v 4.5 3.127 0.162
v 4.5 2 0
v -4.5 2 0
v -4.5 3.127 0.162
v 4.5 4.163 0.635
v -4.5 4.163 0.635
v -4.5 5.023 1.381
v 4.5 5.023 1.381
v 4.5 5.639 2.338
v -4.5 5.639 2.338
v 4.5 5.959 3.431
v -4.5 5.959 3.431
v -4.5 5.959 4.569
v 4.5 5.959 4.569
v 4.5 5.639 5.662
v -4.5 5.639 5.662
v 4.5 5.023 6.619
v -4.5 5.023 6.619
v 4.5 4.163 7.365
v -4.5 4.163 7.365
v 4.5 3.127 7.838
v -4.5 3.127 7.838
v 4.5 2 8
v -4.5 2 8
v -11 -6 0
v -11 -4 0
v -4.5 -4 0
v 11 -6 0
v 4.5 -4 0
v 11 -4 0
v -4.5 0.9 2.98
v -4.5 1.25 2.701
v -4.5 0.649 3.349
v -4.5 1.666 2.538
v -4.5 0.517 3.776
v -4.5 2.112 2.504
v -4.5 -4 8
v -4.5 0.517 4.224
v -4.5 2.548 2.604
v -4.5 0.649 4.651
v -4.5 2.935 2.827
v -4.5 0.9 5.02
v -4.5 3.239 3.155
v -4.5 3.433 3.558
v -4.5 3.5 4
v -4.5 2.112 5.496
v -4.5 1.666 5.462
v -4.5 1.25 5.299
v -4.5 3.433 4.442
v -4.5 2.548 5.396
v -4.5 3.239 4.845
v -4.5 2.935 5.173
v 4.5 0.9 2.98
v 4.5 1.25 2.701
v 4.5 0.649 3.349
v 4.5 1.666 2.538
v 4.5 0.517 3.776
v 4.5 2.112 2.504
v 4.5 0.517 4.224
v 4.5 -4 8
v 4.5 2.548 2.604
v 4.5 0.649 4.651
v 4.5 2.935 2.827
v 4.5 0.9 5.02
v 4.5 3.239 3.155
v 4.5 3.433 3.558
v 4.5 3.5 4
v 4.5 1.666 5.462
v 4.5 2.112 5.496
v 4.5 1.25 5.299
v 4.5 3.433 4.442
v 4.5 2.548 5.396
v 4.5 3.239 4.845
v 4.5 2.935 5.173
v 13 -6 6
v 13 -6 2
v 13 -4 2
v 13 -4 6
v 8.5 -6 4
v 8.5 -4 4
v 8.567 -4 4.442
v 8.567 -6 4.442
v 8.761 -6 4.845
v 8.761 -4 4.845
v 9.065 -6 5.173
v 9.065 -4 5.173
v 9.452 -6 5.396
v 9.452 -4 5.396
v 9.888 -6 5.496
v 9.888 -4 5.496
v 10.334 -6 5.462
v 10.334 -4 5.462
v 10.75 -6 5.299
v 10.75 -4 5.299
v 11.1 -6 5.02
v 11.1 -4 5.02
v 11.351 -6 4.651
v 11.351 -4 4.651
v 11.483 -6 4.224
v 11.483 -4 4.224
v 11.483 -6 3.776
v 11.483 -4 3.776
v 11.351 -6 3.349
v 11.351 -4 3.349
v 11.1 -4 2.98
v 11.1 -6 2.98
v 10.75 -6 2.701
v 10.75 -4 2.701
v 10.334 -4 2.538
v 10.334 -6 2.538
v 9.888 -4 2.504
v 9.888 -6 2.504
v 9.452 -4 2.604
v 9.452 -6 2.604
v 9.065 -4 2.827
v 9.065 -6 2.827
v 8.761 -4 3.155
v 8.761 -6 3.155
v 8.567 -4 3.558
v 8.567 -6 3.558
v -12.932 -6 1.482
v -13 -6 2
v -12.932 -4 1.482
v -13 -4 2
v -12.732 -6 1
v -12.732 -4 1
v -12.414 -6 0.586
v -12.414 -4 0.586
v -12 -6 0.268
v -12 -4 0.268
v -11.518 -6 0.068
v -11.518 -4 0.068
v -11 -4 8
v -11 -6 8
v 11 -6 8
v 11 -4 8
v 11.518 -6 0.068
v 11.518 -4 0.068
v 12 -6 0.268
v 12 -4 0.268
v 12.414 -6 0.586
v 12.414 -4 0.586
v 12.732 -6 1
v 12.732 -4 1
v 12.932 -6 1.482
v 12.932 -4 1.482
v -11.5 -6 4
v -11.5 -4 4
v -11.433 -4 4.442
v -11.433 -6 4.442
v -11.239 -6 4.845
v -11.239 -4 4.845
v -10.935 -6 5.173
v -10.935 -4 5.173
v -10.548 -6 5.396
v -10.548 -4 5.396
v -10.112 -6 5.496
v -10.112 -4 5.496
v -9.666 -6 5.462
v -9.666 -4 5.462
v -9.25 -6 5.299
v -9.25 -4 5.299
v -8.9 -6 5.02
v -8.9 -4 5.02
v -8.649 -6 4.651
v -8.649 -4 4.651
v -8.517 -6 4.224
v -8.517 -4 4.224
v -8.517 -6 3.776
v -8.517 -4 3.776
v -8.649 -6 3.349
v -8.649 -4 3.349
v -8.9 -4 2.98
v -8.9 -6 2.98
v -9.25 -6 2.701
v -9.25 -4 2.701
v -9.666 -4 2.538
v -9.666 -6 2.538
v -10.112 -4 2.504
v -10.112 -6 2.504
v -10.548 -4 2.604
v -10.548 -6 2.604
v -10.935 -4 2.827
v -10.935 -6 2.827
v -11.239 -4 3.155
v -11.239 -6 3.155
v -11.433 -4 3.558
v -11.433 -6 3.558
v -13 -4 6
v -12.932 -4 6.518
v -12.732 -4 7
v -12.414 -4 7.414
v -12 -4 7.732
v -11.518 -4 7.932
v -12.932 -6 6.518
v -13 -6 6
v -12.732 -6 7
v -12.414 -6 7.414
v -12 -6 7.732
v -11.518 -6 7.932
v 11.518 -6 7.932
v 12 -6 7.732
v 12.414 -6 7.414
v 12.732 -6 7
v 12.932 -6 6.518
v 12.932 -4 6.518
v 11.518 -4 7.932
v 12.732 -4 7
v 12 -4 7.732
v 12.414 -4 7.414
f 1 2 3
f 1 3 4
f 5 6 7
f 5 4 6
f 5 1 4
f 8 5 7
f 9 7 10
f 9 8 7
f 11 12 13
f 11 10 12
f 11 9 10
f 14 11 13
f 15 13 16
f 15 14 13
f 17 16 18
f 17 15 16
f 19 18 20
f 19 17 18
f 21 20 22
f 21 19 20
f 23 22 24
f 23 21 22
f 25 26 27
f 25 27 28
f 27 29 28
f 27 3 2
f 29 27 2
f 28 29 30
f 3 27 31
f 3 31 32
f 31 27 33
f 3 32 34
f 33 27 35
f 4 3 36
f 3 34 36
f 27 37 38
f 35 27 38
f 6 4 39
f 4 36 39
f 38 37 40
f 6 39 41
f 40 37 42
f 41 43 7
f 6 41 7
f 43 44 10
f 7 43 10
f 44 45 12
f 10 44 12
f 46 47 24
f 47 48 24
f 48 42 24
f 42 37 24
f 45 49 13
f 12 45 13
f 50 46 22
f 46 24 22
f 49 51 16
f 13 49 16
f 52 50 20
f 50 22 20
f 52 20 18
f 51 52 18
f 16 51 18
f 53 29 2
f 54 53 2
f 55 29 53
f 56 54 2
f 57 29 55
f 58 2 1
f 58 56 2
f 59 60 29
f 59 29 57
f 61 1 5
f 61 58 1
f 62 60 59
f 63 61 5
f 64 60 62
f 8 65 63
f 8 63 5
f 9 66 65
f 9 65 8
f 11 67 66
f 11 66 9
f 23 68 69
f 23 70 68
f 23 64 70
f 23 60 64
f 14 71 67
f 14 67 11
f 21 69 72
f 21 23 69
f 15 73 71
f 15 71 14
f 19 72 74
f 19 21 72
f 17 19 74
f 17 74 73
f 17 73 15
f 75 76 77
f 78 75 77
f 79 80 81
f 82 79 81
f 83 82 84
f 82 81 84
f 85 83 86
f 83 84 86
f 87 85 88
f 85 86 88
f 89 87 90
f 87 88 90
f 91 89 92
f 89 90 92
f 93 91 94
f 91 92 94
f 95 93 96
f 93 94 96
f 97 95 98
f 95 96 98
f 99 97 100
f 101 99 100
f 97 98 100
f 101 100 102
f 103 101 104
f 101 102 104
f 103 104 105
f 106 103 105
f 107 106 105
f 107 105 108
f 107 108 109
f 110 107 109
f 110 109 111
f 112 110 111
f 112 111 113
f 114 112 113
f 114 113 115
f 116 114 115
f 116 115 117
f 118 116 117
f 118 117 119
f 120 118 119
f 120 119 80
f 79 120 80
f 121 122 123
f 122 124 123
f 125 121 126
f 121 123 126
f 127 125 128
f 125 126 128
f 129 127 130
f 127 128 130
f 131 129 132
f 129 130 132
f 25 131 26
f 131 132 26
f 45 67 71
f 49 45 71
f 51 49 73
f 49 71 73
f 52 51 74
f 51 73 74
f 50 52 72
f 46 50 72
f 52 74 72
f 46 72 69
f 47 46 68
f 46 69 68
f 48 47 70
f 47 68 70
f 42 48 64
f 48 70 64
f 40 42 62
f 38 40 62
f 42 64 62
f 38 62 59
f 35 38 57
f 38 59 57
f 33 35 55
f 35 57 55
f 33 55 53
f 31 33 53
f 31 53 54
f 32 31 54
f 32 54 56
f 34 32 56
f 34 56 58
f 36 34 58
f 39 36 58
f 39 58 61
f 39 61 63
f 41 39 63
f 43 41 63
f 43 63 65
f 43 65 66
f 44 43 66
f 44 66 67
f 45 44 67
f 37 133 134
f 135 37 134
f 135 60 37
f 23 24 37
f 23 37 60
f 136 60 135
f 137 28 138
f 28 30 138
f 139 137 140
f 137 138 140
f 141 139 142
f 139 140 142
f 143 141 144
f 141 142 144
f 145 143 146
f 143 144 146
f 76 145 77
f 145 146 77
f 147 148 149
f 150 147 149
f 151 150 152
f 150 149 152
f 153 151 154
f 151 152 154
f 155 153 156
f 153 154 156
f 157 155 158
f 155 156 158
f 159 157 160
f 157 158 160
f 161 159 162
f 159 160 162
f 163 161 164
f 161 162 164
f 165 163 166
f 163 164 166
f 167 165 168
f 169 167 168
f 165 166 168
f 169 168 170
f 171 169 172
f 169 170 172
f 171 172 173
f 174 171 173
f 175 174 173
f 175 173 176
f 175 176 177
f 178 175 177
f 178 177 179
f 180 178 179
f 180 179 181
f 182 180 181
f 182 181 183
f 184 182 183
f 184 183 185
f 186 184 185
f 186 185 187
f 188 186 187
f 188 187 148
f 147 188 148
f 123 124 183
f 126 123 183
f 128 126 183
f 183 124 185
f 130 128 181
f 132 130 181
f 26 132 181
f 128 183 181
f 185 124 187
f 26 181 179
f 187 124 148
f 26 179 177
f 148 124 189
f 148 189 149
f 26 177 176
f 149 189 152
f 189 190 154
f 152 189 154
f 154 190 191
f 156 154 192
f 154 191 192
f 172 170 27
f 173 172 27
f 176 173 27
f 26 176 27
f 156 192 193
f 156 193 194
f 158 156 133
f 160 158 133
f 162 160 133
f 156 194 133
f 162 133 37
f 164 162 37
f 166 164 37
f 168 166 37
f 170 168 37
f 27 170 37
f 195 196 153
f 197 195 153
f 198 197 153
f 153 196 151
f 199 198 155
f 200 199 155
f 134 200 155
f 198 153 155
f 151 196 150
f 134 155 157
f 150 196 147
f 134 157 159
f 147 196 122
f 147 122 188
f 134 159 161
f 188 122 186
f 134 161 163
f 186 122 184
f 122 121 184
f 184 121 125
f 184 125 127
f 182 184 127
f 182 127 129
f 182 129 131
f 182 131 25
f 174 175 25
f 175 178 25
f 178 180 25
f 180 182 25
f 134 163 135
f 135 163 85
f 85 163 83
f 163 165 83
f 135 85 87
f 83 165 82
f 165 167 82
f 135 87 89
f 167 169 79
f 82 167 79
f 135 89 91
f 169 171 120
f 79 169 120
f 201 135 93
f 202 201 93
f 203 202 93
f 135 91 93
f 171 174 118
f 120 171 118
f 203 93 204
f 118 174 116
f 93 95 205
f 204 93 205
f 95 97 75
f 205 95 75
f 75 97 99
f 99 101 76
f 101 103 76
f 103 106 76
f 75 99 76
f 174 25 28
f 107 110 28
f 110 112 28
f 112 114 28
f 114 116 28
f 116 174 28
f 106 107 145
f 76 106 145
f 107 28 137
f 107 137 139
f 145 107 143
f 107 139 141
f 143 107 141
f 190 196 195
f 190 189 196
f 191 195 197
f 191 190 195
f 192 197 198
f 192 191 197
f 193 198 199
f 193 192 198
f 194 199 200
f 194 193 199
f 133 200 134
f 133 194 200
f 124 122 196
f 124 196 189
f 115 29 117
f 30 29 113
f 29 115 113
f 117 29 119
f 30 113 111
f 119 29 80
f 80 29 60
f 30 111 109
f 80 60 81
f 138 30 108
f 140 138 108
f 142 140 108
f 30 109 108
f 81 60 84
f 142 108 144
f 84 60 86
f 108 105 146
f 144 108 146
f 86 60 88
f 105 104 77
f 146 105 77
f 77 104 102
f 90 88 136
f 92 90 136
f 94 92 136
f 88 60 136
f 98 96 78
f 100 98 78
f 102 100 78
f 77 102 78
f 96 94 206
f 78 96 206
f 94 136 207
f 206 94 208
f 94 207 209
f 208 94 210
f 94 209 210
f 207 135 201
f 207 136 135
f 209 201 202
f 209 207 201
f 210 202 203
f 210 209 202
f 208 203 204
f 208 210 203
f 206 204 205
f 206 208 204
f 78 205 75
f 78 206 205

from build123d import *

# Parameters (mm, degrees)
SKETCH1_W           = 26
SKETCH1_H           = 12
BOSS_EXTRUDE1_DEPTH = 8
CUT_EXTRUDE1_DEPTH  = 28.856776554
SKETCH3_W           = 8.5
SKETCH3_H           = 10
CUT_EXTRUDE2_DEPTH  = 17.401219467
SKETCH4_R           = 1.5
CUT_EXTRUDE3_DEPTH  = 21.155644371
FILLET1_R           = 2
SKETCH5_R           = 1.5
CUT_EXTRUDE4_DEPTH  = 19.248287591


with BuildPart() as part:
    # Sketch1 → Boss-Extrude1 (new body)
    with BuildSketch(Plane.XY):
        Rectangle(SKETCH1_W, SKETCH1_H)
    extrude(amount=BOSS_EXTRUDE1_DEPTH)

    # Sketch2 → Cut-Extrude1 (cut, through all)
    with BuildSketch(Plane(origin=(13, 0, 0), x_dir=(0, 0, -1), z_dir=(1, 0, 0))):
        with BuildLine():
            Line((-8, 2), (-8, 7))
            Line((-8, 7), (0, 7))
            Line((0, 7), (0, 2))
            ThreePointArc((0, 2), (-4, 6), (-8, 2))
        make_face()
    extrude(amount=-CUT_EXTRUDE1_DEPTH, mode=Mode.SUBTRACT)

    # Sketch3 → Cut-Extrude2 (cut, through all)
    with BuildSketch(Plane.XY.offset(8)):
        with Locations((8.75, 1)):
            Rectangle(SKETCH3_W, SKETCH3_H)
        with Locations((-8.75, 1)):
            Rectangle(SKETCH3_W, SKETCH3_H)
    extrude(amount=-CUT_EXTRUDE2_DEPTH, mode=Mode.SUBTRACT)

    # Sketch4 → Cut-Extrude3 (cut, through all)
    with BuildSketch(Plane(origin=(4.5, 0, 0), x_dir=(0, 0, -1), z_dir=(1, 0, 0))):
        with Locations(Location((-4, 2, 0), (0, 0, 90))):
            Circle(SKETCH4_R)
    extrude(amount=-CUT_EXTRUDE3_DEPTH, mode=Mode.SUBTRACT)

    # Fillet1
    fillet1_edges = [part.edges().sort_by_distance(p)[0] for p in [
        (13, -5, 8),
        (13, -5, 0),
        (-13, -5, 8),
        (-13, -5, 0),
    ]]
    fillet(fillet1_edges, radius=FILLET1_R)

    # Sketch5 → Cut-Extrude4 (cut, through all)
    with BuildSketch(Plane(origin=(0, -4, 0), x_dir=(1, 0, 0), z_dir=(0, 1, 0))):
        with Locations(Location((-10, -4, 0), (0, 0, 180))):
            Circle(SKETCH5_R)
        with Locations(Location((10, -4, 0), (0, 0, 180))):
            Circle(SKETCH5_R)
    extrude(amount=-CUT_EXTRUDE4_DEPTH, mode=Mode.SUBTRACT)


solid = part.part
